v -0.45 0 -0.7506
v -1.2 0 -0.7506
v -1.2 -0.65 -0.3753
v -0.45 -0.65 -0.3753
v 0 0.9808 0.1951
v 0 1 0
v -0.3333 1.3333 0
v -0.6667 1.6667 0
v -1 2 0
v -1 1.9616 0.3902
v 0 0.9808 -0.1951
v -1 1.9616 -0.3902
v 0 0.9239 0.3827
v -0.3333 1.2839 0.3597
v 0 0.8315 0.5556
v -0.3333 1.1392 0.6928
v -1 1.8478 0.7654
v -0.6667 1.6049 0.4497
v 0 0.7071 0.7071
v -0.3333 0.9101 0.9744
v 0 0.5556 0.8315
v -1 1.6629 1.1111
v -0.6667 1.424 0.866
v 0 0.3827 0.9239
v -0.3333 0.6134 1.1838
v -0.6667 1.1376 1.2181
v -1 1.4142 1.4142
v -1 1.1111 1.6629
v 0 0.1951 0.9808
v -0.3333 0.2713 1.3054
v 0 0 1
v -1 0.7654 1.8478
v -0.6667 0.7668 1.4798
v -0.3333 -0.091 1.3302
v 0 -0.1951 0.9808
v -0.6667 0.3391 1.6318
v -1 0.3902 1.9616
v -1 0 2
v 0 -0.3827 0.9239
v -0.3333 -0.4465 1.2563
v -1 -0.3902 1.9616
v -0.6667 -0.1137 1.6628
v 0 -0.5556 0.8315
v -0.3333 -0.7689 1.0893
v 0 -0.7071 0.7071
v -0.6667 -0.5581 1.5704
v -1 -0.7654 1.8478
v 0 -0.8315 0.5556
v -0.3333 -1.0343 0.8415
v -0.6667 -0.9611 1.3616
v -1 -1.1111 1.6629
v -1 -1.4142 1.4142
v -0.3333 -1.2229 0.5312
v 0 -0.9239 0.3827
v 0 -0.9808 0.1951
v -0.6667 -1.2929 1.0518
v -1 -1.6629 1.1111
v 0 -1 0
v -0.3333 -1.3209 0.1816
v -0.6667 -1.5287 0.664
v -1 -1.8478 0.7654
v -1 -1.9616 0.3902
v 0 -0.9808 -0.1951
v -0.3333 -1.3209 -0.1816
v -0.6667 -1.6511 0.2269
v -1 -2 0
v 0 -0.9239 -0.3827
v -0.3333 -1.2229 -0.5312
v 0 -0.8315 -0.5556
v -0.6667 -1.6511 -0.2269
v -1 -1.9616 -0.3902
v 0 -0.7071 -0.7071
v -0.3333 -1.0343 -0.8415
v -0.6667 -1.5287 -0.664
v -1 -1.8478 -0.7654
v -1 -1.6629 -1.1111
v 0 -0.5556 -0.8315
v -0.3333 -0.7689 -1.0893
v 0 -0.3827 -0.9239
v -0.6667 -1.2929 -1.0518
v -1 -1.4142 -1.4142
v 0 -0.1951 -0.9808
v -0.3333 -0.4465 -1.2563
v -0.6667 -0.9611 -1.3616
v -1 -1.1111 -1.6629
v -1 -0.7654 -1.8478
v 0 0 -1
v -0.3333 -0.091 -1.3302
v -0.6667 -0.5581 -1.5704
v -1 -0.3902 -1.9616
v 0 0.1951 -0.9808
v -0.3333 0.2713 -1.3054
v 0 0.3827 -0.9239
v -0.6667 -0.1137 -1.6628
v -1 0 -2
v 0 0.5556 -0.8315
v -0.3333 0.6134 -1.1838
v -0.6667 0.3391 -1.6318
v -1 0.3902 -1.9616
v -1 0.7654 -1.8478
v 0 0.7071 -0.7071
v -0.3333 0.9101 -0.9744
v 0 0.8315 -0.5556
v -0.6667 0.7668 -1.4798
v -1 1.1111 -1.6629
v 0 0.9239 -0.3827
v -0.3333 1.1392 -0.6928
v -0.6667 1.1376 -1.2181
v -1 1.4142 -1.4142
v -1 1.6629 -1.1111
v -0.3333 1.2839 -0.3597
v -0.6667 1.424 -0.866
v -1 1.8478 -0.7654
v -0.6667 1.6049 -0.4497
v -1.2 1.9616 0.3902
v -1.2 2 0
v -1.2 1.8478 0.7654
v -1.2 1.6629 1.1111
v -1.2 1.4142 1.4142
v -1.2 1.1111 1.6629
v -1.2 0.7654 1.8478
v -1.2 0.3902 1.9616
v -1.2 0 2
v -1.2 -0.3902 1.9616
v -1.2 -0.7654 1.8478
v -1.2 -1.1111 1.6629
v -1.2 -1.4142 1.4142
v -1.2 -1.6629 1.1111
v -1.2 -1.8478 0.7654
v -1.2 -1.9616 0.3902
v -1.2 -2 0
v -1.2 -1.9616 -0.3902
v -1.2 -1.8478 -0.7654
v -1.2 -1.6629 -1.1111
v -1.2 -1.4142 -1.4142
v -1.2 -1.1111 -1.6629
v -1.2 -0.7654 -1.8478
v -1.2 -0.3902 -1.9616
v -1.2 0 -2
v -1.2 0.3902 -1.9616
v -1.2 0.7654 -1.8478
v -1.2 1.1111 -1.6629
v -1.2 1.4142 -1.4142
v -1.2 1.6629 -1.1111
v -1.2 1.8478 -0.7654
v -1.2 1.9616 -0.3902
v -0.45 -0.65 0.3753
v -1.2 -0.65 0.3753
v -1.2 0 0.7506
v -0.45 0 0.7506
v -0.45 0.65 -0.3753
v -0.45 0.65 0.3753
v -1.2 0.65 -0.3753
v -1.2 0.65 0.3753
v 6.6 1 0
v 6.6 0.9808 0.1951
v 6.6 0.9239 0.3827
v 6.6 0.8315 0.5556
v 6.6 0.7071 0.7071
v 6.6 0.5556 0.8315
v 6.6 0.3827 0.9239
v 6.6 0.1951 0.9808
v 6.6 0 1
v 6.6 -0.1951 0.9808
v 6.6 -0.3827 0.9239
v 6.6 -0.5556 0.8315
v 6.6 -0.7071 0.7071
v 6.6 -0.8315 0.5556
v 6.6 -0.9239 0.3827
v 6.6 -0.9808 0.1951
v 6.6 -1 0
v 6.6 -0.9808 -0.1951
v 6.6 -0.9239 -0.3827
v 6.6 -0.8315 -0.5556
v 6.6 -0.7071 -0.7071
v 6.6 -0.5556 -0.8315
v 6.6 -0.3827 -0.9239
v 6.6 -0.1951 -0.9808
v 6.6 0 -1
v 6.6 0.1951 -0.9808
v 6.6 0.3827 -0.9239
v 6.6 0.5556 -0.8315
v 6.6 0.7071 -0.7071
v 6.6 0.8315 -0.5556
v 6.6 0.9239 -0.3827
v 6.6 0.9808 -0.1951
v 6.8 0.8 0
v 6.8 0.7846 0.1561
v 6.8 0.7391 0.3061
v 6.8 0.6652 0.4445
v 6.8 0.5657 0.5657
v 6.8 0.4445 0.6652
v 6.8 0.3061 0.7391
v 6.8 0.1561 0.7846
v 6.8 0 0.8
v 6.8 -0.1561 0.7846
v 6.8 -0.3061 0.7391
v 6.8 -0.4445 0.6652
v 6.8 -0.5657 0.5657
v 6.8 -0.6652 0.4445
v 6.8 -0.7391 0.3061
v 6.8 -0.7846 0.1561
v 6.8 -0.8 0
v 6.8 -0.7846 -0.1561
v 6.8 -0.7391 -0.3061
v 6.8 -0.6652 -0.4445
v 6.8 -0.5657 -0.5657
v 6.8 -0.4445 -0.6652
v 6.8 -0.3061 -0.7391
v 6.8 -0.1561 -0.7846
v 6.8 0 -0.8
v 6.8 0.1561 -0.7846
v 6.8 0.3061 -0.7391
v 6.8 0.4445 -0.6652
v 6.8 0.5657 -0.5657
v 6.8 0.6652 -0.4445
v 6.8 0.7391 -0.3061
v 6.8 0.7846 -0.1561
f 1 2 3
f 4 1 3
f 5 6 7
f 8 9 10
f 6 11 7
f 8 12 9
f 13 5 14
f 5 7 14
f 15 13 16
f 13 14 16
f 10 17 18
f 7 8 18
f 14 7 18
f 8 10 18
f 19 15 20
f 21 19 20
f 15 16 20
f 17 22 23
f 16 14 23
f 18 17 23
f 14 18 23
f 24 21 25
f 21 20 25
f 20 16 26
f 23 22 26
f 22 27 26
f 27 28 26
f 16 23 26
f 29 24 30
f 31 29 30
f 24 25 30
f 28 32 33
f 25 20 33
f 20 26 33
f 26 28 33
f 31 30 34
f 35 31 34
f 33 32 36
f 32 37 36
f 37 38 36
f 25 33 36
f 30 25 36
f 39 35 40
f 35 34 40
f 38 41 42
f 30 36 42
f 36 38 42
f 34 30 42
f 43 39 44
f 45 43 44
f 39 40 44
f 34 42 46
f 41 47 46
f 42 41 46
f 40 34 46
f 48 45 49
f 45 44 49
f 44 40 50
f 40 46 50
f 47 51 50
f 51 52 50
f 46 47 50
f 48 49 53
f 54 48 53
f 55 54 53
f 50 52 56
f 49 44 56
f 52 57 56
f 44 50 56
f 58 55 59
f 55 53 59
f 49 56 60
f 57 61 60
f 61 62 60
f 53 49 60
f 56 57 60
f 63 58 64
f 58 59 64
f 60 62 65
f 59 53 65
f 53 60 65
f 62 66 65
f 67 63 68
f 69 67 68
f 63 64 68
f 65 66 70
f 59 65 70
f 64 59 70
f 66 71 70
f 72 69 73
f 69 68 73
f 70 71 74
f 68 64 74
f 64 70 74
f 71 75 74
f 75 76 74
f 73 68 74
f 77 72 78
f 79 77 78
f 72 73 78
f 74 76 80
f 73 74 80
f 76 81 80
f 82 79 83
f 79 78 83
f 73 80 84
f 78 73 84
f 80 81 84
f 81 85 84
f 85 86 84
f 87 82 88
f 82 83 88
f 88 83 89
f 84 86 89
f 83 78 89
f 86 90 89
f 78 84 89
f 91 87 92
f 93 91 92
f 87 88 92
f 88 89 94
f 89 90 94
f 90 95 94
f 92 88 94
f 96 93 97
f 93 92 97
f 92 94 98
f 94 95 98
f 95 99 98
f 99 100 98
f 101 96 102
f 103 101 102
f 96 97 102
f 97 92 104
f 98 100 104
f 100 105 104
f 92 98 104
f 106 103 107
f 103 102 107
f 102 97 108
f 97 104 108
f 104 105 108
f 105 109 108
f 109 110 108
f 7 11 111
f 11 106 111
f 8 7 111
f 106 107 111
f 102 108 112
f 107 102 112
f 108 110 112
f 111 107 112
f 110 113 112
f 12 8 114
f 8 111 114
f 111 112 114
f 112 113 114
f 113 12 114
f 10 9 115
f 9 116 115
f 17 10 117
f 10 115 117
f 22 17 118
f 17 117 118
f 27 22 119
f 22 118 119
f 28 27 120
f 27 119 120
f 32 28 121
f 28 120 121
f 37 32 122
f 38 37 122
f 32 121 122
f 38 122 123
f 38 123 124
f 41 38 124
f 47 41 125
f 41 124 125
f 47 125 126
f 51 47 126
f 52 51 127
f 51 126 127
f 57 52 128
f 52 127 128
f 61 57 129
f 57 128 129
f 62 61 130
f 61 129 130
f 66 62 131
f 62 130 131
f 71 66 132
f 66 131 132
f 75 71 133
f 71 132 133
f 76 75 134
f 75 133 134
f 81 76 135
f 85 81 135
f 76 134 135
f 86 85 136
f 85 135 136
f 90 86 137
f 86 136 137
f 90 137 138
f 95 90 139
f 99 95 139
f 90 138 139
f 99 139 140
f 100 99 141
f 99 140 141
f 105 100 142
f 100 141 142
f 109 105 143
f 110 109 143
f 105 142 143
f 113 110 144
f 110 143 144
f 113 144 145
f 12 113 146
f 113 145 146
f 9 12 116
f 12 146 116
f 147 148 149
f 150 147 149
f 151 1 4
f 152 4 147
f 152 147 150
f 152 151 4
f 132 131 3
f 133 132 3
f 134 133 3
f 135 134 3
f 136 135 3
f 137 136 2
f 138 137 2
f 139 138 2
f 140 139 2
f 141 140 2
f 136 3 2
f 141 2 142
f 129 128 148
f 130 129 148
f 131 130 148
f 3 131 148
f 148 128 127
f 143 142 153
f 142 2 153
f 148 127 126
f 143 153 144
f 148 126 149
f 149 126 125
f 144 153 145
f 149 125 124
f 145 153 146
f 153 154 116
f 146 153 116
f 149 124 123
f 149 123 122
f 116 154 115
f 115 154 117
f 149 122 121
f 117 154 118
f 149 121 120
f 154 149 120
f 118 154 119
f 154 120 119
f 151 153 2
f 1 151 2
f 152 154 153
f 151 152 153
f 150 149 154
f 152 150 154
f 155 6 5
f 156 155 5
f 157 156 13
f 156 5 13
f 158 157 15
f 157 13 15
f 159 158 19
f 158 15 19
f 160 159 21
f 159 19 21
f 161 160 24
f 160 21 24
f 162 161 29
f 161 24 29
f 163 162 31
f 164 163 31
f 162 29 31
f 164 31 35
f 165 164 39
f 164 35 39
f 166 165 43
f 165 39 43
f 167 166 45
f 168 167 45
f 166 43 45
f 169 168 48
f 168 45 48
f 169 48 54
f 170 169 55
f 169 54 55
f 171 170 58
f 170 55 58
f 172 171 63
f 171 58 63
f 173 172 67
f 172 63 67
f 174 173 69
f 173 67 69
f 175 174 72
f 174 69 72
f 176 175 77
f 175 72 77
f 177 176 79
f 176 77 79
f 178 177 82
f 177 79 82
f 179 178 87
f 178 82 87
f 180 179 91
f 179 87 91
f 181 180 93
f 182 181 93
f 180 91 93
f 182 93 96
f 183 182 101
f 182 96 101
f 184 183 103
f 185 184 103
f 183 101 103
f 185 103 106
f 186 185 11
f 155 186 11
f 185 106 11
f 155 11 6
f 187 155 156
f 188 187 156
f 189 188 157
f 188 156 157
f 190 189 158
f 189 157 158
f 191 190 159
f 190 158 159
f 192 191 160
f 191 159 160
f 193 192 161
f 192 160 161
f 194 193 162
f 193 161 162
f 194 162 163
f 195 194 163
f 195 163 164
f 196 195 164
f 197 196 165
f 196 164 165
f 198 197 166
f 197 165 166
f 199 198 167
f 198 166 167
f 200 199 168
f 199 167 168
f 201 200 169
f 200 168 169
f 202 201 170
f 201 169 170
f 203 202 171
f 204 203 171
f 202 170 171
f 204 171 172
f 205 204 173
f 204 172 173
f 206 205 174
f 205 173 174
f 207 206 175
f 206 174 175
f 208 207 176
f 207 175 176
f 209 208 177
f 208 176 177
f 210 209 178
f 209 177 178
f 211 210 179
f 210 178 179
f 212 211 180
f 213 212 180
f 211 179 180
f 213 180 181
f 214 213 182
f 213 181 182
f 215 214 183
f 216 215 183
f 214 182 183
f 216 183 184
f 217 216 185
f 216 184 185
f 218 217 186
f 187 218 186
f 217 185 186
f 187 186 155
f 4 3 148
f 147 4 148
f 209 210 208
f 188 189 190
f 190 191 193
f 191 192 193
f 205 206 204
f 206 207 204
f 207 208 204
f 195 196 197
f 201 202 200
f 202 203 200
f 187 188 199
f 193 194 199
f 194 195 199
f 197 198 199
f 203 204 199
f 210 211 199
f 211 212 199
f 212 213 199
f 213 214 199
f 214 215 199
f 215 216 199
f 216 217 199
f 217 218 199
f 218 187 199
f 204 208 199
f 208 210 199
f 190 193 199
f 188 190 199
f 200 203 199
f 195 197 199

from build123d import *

# Parameters (mm, degrees)
CHAMFER1_SIZE      = 0.2
CUT_EXTRUDE1_DEPTH = 0.75


with BuildPart() as part:
    # Sketch1 → Revolve1 (revolve)
    with BuildSketch(Plane.XY):
        Polygon((0, 1), (-1, 2), (-1.2, 2), (-1.2, 0), (6.8, 0), (6.8, 1), align=None)
    revolve(axis=Axis((-1.2, 0, 0), (1, 0, 0)))

    # Chamfer1
    chamfer1_edges = [part.edges().sort_by_distance(p)[0] for p in [
        (6.8, -1, 0),
    ]]
    chamfer(chamfer1_edges, length=CHAMFER1_SIZE)

    # Sketch2 → Cut-Extrude1 (cut)
    with BuildSketch(Plane.ZY.offset(1.2)):
        Polygon((-0.75055535, 0), (-0.375277675, -0.65), (0.375277675, -0.65), (0.75055535, 0), (0.375277675, 0.65), (-0.375277675, 0.65), align=None)
    extrude(amount=-CUT_EXTRUDE1_DEPTH, mode=Mode.SUBTRACT)


solid = part.part
